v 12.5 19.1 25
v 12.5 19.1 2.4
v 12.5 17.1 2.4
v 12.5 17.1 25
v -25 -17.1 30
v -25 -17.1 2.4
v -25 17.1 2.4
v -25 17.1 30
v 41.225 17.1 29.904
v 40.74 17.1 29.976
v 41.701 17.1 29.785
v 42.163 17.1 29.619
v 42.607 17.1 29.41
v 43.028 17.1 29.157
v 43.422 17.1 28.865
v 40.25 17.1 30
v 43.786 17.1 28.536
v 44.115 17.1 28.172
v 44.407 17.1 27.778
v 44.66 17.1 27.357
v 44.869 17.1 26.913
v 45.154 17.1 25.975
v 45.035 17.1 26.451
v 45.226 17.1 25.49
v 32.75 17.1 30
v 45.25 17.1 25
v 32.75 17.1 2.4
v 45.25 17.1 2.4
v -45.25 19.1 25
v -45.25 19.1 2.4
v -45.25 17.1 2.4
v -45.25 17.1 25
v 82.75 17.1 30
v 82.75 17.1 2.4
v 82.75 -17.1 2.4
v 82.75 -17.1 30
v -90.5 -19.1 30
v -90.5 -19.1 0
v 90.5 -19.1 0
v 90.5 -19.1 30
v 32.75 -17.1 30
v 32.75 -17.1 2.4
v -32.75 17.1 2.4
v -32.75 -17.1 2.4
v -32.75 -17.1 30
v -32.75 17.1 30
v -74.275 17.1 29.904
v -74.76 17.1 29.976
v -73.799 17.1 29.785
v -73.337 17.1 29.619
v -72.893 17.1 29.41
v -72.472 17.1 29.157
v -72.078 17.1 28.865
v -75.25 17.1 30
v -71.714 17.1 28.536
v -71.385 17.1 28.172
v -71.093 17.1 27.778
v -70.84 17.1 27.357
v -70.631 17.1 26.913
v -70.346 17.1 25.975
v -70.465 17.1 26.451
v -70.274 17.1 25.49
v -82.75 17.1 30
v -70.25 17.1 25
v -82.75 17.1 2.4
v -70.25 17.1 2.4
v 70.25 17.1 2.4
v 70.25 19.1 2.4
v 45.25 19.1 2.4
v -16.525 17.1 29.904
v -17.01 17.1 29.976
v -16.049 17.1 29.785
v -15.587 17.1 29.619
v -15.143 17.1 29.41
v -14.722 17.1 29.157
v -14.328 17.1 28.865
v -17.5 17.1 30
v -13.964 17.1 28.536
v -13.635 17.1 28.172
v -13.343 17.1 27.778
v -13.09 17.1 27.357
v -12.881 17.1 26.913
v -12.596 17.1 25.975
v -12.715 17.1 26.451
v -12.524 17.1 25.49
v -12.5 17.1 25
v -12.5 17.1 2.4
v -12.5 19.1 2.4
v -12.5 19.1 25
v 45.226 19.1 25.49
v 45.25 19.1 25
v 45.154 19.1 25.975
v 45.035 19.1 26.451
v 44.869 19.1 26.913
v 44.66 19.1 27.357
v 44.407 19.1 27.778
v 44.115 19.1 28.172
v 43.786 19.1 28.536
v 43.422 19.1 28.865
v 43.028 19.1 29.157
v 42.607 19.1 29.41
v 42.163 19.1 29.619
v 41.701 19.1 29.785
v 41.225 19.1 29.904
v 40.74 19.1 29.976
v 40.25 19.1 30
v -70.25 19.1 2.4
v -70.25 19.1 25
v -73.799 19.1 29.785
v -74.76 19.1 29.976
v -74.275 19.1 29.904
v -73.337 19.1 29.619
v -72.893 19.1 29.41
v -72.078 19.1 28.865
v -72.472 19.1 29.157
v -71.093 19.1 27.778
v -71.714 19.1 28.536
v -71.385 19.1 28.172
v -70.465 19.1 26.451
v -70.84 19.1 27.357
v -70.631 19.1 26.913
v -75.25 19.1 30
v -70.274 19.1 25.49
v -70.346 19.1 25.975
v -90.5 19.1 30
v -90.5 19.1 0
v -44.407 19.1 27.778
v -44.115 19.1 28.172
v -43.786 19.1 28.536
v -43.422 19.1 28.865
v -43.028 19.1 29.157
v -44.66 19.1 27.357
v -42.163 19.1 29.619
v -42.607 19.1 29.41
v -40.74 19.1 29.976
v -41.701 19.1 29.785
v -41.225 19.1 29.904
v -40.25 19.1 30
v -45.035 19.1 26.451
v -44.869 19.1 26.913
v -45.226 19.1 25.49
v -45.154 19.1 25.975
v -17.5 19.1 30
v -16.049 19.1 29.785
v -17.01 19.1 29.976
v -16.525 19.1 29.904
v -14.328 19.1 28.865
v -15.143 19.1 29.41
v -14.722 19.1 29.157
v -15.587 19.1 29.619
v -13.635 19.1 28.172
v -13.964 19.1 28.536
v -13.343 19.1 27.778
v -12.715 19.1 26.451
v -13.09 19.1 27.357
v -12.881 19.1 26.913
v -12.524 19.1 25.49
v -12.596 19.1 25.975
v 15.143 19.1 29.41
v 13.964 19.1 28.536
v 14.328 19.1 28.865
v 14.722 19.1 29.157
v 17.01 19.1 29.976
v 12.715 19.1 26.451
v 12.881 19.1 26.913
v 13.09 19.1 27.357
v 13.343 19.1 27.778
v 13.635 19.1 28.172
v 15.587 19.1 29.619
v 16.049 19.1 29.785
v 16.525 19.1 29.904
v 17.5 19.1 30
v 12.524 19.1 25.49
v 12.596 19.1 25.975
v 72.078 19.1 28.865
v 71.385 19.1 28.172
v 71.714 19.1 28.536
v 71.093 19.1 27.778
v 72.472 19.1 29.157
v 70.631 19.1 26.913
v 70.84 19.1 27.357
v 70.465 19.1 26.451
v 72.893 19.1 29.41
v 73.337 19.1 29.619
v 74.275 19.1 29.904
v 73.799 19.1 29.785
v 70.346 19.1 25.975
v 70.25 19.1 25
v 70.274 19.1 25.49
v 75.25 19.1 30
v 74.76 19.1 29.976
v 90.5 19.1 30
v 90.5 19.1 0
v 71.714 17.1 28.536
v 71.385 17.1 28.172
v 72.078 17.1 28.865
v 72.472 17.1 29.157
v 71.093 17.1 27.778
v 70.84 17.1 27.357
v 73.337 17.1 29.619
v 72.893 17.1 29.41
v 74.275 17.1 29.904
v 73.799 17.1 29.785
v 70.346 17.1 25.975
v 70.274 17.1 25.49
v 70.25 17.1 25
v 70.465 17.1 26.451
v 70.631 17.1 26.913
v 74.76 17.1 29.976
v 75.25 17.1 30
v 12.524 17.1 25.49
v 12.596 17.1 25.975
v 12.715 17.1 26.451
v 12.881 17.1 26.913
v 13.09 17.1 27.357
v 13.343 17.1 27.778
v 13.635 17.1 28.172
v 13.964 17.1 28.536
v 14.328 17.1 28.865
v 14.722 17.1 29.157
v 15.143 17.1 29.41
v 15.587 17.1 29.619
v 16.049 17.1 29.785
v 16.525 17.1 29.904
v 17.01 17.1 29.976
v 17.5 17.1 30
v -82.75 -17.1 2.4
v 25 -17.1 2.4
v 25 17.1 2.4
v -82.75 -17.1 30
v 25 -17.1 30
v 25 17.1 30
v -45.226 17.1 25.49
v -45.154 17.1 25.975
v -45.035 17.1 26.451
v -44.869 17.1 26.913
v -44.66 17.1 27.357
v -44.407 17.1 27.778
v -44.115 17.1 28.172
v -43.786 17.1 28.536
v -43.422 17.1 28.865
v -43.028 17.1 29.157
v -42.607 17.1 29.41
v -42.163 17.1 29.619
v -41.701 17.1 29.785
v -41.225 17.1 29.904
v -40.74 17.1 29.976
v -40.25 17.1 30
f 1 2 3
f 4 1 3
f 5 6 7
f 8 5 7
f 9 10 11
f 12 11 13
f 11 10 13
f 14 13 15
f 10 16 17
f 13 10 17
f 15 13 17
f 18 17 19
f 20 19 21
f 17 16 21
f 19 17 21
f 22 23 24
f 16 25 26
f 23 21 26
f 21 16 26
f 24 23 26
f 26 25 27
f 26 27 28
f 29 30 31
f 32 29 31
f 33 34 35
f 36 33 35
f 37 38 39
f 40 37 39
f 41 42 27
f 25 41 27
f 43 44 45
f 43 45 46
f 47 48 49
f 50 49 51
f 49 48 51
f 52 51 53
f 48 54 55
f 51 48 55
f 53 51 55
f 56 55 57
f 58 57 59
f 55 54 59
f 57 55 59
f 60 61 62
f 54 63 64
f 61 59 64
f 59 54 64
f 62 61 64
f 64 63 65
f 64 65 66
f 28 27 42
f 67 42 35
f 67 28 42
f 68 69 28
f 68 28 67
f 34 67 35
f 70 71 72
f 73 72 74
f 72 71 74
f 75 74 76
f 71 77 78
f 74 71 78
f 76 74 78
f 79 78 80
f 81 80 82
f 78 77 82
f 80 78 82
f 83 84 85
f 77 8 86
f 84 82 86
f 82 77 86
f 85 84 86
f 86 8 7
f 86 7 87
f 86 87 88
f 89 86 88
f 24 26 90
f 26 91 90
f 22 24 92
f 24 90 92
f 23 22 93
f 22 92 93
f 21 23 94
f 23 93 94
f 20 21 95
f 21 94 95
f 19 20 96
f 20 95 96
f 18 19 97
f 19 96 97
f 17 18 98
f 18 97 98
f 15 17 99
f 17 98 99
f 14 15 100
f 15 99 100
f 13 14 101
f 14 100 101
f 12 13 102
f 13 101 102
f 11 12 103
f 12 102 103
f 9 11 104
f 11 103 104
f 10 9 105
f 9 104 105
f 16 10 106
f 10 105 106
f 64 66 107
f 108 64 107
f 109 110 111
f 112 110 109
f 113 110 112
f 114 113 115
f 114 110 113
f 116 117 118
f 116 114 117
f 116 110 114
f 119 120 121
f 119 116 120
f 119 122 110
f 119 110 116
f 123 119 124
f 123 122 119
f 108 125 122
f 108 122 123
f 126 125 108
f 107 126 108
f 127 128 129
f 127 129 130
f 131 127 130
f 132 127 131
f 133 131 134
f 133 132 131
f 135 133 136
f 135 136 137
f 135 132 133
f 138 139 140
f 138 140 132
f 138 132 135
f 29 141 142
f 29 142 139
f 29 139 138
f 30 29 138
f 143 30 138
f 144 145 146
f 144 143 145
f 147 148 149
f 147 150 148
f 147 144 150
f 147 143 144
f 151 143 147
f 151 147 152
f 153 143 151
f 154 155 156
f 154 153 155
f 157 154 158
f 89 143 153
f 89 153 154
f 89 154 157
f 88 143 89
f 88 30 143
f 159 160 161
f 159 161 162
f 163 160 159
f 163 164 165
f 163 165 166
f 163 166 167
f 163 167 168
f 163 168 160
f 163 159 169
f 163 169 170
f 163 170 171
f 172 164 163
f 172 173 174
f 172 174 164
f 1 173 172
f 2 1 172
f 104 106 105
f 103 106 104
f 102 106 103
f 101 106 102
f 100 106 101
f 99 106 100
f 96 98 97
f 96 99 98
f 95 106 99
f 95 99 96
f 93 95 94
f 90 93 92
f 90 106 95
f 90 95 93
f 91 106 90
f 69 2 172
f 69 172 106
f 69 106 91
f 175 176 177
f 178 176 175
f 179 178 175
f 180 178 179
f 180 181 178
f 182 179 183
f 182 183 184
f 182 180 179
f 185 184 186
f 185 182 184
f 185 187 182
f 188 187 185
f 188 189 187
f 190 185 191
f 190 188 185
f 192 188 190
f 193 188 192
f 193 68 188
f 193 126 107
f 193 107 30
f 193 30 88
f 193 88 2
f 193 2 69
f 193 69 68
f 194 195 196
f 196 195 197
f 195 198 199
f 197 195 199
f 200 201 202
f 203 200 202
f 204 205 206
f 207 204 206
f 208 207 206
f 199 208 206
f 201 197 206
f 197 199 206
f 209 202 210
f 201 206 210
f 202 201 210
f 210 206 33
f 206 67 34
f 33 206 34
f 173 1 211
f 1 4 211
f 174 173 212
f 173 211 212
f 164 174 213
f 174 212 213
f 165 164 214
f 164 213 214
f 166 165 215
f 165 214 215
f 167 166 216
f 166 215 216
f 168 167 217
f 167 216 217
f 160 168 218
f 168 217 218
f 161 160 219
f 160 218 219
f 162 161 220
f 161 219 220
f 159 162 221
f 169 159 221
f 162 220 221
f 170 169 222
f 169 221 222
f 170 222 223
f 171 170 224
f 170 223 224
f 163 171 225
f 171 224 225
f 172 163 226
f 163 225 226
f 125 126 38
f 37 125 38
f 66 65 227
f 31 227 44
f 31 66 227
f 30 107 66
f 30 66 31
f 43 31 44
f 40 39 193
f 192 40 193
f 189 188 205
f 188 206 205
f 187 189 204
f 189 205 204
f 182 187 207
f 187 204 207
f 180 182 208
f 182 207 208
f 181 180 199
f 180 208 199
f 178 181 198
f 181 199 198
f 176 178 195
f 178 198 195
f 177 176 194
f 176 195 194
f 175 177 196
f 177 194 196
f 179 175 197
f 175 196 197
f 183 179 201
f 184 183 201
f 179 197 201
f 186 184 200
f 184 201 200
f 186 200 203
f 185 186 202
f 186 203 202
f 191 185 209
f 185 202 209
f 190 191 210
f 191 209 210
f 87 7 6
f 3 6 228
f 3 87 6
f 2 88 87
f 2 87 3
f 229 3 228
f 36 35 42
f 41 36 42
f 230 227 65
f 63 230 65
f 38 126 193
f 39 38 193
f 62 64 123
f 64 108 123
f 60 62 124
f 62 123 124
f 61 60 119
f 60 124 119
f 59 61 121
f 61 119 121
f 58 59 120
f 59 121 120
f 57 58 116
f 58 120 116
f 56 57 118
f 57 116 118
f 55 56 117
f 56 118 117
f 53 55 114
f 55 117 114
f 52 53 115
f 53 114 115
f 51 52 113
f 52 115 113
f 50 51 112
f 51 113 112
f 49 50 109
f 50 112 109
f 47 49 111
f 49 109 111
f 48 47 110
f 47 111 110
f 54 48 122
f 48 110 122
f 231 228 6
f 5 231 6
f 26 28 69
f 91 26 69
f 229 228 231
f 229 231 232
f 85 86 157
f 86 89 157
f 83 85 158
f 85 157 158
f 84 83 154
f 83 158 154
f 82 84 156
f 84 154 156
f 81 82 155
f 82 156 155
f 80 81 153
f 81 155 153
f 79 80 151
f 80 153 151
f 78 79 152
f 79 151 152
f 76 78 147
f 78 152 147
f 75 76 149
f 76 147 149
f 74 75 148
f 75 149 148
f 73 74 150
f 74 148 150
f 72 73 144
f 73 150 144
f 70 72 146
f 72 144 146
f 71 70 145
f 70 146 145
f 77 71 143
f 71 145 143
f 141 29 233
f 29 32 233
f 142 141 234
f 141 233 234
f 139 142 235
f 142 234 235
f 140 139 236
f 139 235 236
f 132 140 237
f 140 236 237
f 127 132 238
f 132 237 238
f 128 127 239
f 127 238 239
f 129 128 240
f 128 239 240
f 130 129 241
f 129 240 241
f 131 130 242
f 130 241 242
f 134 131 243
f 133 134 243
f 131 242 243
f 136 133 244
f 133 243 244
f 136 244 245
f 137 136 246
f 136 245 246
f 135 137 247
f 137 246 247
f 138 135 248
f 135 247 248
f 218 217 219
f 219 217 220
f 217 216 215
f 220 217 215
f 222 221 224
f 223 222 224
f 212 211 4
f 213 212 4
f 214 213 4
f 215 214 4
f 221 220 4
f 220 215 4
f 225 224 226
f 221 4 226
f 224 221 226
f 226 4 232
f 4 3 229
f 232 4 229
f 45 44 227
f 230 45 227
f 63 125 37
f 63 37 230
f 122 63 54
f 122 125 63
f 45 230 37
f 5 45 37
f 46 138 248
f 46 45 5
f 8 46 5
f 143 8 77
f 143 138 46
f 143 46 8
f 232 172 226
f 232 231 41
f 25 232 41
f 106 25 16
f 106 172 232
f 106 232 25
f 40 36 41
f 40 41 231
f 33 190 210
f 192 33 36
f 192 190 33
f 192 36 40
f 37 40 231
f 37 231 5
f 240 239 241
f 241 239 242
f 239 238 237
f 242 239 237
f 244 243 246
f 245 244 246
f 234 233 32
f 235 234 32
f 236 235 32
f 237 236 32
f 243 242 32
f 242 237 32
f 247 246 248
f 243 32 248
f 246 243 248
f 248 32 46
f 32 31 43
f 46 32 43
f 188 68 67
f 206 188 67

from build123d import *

# Parameters (mm, degrees)
F0_W     = 25
F0_H     = 2
F0_W_2   = 7.75
F0_H_2   = 34.2
F1_DEPTH = 30
F0_W_3   = 12.5
F2_DEPTH = 2.4
F3_R     = 5


with BuildPart() as f1:
    # F0 (on Top) → F1 (new body)
    with BuildSketch(Plane.XY):
        Polygon((-90.5, -19.1), (-70.25, -19.1), (-70.25, -17.1), (-82.75, -17.1), (-82.75, 17.1), (-70.25, 17.1), (-70.25, 19.1), (-90.5, 19.1), align=None)
        with Locations((-57.75, -18.1)):
            Rectangle(F0_W, F0_H)
        Polygon((-45.25, -19.1), (-12.5, -19.1), (-12.5, -17.1), (-25, -17.1), (-32.75, -17.1), (-45.25, -17.1), align=None)
        Polygon((-12.5, 17.1), (-12.5, 19.1), (-45.25, 19.1), (-45.25, 17.1), (-32.75, 17.1), (-25, 17.1), align=None)
        with Locations((0, -18.1)):
            Rectangle(F0_W, F0_H)
        Polygon((12.5, -19.1), (45.25, -19.1), (45.25, -17.1), (32.75, -17.1), (25, -17.1), (12.5, -17.1), align=None)
        with Locations((57.75, -18.1)):
            Rectangle(F0_W, F0_H)
        Polygon((70.25, -19.1), (90.5, -19.1), (90.5, 19.1), (70.25, 19.1), (70.25, 17.1), (82.75, 17.1), (82.75, -17.1), (70.25, -17.1), align=None)
        Polygon((45.25, 17.1), (45.25, 19.1), (12.5, 19.1), (12.5, 17.1), (25, 17.1), (32.75, 17.1), align=None)
        with Locations((28.875, 0)):
            Rectangle(F0_W_2, F0_H_2)
        with Locations((-28.875, 0)):
            Rectangle(F0_W_2, F0_H_2)
    extrude(amount=F1_DEPTH)

    # F0 (on Top) → F2 (join)
    with BuildSketch(Plane.XY):
        with Locations((-57.75, 18.1)):
            Rectangle(F0_W, F0_H)
        with Locations((-76.5, 0)):
            Rectangle(F0_W_3, F0_H_2)
        with Locations((-57.75, 0)):
            Rectangle(F0_W, F0_H_2)
        with Locations((-39, 0)):
            Rectangle(F0_W_3, F0_H_2)
        with Locations((-18.75, 0)):
            Rectangle(F0_W_3, F0_H_2)
        Rectangle(F0_W, F0_H_2)
        with Locations((0, 18.1)):
            Rectangle(F0_W, F0_H)
        with Locations((18.75, 0)):
            Rectangle(F0_W_3, F0_H_2)
        with Locations((39, 0)):
            Rectangle(F0_W_3, F0_H_2)
        with Locations((57.75, 0)):
            Rectangle(F0_W, F0_H_2)
        with Locations((57.75, 18.1)):
            Rectangle(F0_W, F0_H)
        with Locations((76.5, 0)):
            Rectangle(F0_W_3, F0_H_2)
    extrude(amount=F2_DEPTH)

    # F3
    f3_edges = [f1.edges().sort_by_distance(p)[0] for p in [
        (-70.25, 18.1, 30),
        (-45.25, 18.1, 30),
        (-12.5, 18.1, 30),
        (12.5, 18.1, 30),
        (45.25, 18.1, 30),
        (70.25, 18.1, 30),
    ]]
    fillet(f3_edges, radius=F3_R)


solid = f1.part
